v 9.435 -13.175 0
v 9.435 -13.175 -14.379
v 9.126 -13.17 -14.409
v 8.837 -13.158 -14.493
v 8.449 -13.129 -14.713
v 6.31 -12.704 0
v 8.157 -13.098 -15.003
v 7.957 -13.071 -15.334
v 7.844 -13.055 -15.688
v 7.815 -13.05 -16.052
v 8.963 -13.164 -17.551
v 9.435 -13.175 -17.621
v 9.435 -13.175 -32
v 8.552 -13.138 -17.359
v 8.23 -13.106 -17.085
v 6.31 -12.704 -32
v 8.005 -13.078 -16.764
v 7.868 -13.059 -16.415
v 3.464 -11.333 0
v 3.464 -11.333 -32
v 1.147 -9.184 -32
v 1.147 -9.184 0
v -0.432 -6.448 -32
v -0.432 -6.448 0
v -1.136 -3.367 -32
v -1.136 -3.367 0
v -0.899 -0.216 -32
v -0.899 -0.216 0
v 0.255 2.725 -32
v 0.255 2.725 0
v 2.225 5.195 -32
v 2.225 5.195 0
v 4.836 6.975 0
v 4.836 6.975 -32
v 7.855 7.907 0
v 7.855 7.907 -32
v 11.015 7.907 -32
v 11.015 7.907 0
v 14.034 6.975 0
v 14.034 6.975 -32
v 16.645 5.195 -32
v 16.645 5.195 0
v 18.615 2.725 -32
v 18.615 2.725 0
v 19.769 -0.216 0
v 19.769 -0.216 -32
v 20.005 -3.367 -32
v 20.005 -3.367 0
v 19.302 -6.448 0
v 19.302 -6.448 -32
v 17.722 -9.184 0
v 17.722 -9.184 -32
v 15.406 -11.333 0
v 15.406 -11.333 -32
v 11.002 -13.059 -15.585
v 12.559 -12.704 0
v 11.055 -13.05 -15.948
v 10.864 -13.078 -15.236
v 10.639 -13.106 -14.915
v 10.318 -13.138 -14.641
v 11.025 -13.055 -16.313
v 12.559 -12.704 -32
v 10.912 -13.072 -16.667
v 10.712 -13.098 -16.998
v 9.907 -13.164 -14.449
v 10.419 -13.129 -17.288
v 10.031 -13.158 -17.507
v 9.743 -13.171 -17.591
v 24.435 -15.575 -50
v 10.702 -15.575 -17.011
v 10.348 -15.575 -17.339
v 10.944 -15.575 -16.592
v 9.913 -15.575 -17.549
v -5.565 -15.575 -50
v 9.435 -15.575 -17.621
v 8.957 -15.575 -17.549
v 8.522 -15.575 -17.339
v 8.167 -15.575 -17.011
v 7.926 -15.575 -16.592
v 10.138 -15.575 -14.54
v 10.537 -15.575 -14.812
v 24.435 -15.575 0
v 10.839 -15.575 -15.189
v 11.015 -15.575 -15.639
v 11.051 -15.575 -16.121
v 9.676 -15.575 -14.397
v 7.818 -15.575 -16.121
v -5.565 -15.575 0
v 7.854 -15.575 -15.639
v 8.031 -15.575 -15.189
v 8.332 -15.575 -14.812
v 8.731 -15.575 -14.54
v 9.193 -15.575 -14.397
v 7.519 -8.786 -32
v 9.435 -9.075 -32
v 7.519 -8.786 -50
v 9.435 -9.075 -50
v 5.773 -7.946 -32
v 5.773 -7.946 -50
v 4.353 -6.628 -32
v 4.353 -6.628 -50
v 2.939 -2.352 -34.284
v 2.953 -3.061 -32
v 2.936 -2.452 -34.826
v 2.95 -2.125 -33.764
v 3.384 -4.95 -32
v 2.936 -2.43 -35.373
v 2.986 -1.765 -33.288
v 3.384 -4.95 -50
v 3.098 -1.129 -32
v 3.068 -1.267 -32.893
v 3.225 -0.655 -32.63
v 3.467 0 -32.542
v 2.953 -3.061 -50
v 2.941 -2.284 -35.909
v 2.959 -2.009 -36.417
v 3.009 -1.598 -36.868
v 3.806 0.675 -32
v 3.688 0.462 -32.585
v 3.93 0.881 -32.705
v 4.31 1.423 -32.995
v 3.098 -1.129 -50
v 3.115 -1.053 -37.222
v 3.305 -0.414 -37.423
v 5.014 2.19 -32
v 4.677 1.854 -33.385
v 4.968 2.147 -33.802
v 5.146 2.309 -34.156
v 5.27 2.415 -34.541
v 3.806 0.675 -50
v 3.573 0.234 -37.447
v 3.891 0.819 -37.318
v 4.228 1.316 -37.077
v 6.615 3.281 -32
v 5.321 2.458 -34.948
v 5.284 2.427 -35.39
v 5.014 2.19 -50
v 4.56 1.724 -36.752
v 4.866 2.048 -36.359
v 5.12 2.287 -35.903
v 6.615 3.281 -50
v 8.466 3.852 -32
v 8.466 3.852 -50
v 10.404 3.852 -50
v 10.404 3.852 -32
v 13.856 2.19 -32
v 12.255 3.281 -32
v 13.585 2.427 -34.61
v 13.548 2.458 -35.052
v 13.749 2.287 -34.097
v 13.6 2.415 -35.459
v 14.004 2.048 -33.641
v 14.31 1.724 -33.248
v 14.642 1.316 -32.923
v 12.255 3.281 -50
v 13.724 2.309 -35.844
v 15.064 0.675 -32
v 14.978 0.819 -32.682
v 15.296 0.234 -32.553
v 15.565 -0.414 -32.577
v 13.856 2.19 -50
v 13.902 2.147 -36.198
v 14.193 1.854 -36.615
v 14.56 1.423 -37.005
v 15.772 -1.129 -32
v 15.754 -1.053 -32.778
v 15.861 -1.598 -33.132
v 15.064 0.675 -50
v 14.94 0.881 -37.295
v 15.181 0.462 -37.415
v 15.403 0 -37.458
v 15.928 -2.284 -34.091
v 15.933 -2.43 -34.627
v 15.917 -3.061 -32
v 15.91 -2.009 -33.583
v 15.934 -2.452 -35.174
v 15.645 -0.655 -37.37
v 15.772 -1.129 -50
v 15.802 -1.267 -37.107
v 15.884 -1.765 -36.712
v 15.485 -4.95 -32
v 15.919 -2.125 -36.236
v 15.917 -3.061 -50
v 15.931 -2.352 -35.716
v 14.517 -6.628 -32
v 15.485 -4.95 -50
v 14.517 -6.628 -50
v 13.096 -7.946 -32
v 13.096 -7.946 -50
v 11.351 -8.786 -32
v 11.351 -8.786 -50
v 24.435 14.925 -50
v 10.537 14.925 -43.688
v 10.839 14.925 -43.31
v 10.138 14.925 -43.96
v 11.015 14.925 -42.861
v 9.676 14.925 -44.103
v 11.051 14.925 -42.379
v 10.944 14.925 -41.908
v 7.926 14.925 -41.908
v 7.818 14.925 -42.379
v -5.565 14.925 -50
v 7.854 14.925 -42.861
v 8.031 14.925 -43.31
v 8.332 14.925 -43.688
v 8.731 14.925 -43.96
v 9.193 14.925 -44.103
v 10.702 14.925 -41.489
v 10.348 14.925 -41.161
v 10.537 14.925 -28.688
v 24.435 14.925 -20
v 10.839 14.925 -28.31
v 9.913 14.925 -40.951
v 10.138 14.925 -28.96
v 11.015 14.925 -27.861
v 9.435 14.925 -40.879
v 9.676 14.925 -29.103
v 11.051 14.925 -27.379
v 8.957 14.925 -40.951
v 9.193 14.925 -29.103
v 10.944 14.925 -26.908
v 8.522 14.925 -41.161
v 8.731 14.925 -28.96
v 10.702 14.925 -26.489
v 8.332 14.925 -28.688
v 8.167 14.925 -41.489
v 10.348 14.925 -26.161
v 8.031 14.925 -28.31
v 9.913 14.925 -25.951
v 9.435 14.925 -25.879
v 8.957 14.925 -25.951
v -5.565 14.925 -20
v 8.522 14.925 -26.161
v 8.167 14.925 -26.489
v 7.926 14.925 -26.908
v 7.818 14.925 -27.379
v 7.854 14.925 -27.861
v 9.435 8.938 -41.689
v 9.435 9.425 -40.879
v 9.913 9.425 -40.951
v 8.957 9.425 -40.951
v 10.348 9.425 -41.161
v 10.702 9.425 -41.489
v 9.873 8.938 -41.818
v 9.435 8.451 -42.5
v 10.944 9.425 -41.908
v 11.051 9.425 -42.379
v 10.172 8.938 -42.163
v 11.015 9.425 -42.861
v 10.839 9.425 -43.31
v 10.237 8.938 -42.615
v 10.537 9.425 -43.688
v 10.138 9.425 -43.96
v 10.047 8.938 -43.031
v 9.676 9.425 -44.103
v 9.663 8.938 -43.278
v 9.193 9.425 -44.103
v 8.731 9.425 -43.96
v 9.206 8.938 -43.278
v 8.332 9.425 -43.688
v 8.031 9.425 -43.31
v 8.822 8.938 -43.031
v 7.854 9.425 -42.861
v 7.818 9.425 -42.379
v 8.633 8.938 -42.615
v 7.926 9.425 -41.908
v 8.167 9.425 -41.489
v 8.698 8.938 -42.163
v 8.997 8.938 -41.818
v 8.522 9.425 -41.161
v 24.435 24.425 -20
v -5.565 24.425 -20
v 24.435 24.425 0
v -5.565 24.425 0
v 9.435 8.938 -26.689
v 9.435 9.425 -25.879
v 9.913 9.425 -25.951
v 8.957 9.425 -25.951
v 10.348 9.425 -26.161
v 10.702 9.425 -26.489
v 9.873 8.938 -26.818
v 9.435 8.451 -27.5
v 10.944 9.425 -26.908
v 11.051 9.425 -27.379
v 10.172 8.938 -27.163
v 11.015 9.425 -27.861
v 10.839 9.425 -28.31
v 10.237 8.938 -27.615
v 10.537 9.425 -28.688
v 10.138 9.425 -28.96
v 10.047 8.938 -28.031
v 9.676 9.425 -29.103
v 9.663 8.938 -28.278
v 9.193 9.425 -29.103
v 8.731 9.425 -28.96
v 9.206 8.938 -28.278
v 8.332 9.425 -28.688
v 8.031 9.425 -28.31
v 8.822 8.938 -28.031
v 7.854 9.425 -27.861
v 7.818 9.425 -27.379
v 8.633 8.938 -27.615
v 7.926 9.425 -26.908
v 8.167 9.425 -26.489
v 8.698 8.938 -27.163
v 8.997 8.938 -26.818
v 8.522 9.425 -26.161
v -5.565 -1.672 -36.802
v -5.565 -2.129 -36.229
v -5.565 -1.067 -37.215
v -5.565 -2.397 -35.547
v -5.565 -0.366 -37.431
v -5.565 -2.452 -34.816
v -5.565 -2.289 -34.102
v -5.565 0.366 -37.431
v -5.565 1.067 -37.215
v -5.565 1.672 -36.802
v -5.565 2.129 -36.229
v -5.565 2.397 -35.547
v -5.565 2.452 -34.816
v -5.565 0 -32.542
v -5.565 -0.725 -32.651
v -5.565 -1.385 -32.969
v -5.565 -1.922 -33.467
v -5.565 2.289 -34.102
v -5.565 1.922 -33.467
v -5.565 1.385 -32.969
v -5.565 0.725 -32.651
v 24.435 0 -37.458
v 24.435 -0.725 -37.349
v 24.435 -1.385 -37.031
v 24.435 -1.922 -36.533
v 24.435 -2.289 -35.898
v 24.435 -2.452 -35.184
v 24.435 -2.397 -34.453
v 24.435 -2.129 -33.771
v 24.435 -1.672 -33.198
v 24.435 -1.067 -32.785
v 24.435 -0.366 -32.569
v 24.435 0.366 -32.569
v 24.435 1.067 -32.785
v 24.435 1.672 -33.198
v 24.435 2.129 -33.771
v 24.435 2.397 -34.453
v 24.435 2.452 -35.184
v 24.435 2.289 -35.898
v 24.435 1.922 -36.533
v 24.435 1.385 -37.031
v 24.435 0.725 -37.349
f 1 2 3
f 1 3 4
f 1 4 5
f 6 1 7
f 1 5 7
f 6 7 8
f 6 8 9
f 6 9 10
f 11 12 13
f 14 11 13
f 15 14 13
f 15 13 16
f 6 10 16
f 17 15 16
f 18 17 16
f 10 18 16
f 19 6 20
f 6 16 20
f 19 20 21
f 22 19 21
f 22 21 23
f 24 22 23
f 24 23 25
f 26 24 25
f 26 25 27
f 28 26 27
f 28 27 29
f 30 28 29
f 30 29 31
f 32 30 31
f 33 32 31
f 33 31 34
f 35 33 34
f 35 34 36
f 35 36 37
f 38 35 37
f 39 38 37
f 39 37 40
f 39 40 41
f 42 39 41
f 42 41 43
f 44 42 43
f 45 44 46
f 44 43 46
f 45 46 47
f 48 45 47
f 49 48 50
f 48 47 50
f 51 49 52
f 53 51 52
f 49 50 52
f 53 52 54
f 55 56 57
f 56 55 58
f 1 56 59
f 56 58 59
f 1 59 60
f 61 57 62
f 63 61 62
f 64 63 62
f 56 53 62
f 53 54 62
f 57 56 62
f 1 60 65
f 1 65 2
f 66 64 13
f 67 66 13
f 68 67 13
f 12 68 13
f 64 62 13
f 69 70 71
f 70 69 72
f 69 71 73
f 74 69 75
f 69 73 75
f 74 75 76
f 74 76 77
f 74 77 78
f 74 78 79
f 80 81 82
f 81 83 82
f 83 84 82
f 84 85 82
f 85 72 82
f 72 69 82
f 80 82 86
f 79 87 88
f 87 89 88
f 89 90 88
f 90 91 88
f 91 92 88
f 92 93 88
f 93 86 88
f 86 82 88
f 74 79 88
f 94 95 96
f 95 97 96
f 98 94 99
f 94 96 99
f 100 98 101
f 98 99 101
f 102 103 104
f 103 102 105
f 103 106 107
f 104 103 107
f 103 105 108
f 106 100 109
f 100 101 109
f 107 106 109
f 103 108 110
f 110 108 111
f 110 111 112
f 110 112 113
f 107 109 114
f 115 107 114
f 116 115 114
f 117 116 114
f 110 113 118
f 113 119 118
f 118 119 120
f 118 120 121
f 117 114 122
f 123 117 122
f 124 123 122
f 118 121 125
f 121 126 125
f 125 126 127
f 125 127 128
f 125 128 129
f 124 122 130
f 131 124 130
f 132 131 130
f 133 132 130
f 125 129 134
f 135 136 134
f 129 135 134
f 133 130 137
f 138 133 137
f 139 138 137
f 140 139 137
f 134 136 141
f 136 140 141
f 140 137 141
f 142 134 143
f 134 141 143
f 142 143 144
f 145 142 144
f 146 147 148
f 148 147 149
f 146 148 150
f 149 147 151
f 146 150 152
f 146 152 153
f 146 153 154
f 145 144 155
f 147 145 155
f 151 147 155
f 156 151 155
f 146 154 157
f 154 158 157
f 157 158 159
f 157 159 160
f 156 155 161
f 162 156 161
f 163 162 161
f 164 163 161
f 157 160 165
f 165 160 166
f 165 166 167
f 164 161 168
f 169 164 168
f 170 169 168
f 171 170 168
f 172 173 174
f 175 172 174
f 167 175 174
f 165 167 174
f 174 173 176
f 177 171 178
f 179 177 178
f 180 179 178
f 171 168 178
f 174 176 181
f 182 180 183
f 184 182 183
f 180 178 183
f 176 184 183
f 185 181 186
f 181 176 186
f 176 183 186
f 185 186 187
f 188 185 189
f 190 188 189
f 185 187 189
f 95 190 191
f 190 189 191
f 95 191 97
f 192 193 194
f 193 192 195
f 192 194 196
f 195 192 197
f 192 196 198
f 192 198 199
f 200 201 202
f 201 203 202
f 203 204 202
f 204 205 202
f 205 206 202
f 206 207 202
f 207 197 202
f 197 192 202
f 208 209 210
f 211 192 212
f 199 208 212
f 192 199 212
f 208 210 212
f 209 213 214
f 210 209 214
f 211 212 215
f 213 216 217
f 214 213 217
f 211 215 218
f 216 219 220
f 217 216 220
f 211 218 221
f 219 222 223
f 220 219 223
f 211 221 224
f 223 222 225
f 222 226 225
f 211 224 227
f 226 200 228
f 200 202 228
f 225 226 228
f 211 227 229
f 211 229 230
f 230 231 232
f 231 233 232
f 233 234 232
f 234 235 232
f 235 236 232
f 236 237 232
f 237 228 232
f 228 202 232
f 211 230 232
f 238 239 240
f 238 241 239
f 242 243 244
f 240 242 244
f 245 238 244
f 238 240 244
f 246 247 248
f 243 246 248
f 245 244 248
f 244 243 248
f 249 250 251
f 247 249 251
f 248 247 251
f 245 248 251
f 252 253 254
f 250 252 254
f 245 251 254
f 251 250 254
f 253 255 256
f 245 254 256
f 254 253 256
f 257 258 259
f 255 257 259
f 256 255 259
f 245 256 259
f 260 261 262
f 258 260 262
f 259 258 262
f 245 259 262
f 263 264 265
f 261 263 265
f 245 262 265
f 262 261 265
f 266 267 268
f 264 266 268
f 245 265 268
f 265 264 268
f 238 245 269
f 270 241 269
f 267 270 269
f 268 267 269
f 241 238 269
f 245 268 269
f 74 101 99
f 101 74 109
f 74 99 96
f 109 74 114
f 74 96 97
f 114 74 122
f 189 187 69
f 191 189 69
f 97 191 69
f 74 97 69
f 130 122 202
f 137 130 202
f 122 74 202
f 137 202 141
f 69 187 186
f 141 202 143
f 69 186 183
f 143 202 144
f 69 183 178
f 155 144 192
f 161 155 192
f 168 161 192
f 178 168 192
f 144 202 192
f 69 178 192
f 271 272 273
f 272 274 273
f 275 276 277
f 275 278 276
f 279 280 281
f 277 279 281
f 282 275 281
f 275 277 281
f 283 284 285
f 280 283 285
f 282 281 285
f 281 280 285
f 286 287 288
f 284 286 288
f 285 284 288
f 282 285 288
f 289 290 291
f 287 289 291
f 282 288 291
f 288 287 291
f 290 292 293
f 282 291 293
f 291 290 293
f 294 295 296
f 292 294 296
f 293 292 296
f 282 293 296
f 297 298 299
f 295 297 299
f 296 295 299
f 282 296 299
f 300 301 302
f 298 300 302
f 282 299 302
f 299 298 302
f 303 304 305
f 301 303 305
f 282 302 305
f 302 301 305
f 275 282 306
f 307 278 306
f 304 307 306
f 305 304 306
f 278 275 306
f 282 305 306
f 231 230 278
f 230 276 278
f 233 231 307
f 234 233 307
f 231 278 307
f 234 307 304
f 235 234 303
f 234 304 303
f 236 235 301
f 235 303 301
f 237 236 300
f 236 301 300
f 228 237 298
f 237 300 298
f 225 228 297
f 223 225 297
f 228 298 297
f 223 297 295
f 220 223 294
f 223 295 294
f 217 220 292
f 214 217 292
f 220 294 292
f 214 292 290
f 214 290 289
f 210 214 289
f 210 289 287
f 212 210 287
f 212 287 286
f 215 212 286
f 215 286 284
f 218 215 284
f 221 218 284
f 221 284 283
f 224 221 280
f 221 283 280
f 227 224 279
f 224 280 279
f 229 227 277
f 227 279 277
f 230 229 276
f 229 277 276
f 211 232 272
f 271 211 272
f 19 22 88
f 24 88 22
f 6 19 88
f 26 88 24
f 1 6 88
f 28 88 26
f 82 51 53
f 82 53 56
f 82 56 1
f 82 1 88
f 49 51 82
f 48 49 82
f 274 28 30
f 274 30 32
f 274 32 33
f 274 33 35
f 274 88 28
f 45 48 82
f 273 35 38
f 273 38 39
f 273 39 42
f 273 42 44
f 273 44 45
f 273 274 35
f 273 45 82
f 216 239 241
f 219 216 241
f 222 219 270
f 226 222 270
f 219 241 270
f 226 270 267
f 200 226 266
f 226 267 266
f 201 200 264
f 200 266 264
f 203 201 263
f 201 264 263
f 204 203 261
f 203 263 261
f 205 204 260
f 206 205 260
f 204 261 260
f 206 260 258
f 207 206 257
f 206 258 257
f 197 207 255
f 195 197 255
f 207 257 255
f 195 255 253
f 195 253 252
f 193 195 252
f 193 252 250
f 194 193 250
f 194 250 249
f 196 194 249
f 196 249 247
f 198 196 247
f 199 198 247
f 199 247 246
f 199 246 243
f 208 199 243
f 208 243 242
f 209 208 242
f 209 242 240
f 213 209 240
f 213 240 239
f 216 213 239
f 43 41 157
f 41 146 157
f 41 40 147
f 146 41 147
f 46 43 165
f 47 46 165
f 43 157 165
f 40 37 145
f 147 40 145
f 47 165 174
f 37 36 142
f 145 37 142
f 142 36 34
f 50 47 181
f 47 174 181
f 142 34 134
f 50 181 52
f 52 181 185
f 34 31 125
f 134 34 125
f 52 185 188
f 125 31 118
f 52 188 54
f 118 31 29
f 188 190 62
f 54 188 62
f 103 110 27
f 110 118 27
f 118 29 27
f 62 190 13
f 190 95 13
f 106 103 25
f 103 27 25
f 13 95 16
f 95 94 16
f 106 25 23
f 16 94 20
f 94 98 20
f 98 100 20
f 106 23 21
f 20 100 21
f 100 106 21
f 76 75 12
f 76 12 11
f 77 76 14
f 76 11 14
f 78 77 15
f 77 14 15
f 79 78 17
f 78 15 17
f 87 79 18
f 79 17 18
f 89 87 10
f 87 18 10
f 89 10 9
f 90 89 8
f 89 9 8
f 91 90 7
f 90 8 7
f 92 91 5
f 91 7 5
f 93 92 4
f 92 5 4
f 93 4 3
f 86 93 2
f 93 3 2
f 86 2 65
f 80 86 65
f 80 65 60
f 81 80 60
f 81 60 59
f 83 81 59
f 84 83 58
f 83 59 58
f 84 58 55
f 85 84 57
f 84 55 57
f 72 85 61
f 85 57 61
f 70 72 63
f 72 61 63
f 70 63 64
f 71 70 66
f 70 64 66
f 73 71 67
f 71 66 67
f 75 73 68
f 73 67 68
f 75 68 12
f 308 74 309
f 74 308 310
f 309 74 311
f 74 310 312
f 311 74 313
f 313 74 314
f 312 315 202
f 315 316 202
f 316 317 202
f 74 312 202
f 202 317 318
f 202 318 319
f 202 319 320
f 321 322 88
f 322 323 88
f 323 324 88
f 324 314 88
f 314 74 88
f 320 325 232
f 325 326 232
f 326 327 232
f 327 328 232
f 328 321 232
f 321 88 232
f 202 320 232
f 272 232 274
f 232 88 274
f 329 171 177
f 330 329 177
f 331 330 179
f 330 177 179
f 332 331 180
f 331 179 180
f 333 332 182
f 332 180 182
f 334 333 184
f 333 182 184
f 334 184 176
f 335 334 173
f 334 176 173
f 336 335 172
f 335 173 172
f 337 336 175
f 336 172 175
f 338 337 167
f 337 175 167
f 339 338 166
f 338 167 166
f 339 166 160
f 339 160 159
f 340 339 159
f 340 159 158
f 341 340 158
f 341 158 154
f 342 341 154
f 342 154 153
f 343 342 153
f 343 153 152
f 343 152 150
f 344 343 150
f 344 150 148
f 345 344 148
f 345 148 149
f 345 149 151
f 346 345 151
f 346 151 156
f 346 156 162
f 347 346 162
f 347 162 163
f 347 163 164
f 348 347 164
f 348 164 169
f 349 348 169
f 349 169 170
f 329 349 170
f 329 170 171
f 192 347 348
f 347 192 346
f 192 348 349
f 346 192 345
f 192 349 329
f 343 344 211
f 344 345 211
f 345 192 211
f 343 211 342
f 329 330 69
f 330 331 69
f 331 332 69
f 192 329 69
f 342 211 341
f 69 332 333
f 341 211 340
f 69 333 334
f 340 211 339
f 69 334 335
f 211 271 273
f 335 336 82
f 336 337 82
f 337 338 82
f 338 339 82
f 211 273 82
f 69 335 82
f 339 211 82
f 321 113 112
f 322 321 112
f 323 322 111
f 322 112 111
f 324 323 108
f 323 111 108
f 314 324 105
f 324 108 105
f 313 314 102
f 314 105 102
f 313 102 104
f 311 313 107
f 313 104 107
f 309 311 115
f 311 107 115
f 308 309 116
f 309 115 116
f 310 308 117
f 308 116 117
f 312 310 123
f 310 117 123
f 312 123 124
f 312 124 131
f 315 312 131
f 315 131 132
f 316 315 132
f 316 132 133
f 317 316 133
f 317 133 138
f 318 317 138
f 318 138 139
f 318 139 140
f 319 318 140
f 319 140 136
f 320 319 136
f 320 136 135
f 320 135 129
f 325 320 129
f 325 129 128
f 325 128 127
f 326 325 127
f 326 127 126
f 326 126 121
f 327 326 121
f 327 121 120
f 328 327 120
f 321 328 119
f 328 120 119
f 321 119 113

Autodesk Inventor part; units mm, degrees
ref_plane "YZ Plane" through (0, 0, 0) normal (1, 0, 0) x (0, 1, 0)
ref_plane "XZ Plane" through (0, 0, 0) normal (0, 1, 0) x (-1, 0, 0)
ref_plane "XY Plane" through (0, 0, 0) normal (0, 0, 1) x (1, 0, 0)
sketch "Esboço1" plane through (0, 0, 0) normal (0, 0, 1) x (1, 0, 0)
  circle A0 centre (9.5, -2.575) radius 10.5 construction
  line L0 (21.9348, 5.0533) -> (21.9348, -29.9467) construction
  line L1 (-3.0652, -29.9467) -> (-3.0652, 5.0533) construction
  circle A1 centre (9.5, -2.575) radius 10.575 construction
  line L2 (21.9348, -13.15) -> (-3.0652, -13.15) construction
  line L3 (9.4348, -13.15) -> (9.4348, 4.425) construction
  line L4 (-5.5652, 24.425) -> (24.4348, 24.425)
  line L5 (24.4348, 24.425) -> (24.4348, -15.575)
  line L6 (24.4348, -15.575) -> (-5.5652, -15.575)
  line L7 (-5.5652, -15.575) -> (-5.5652, 24.425)
  line L8 (-5.5652, 24.425) -> (24.4348, -15.575) construction
  line L9 (24.4348, 24.425) -> (-5.5652, -15.575) construction
  point P0 (0, 0)
  dimension "d1" = 21.15
  dimension "d3" = 30
  dimension "d4" = 40
  dimension "d51" = 13
extrude "Extrusão1" add sketch "Esboço1" against normal blind 50
sketch "Esboço2" plane through (0, 0, 0) normal (0, 0, 1) x (1, 0, 0)
  circle A0 centre (9.4348, -2.575) radius 5.995 construction
  line L0 (24.4348, -15.575) -> (-5.5652, -15.575) projected
  line L1 (-5.5652, -15.575) -> (-5.5652, 24.425) projected
  dimension "d52" = 13
  dimension "d53" = 15
hole "Furo1" at (9.4348, -2.575, 0) direction (0, 0, -1) diameter 13 end through all counterbore diameter 21.2 counterbore depth 32
sketch "Esboço3" plane through (-5.5652, -15.575, 0) normal (-1, 0, 0) x (0, 0, 1)
  line L0 (-50, 0) -> (-50, 40) construction
  line L1 (0, 40) -> (0, 0) construction
  line L2 (-50, 40) -> (0, 40) construction
  line L3 (0, 40) -> (0, 0) construction
  line L4 (0, 0) -> (-50, 0) construction
  line L5 (-50, 0) -> (-50, 40) construction
  line L6 (0, 15.575) -> (-50, 15.575) construction
  line L7 (-35, 15.575) -> (-35, 40) construction
hole "Furo2" at (-5.5652, 0, -35) direction (1, 0, 0) diameter 4.917 depth 13 tip angle 118 thread size "M6x1" class "6H" standard "ANSI Metric M Profile"
sketch "Esboço4" plane through (-5.5652, -15.575, 0) normal (-1, 0, 0) x (0, 0, 1)
  line L0 (-50, 30.5) -> (-20, 30.5)
  line L1 (-20, 30.5) -> (-20, 40)
  line L2 (-20, 40) -> (-50, 40)
  line L3 (-50, 40) -> (-50, 30.5)
  point P0 (0, 15.575)
  point P1 (-50, 0)
  dimension "d22" = 30.5
  dimension "d23" = 30
extrude "Extrusão2" cut sketch "Esboço4" against normal blind 31.25
sketch "Esboço6" plane through (24.4348, -15.575, 0) normal (1, 0, 0) x (0, 0, -1)
  circle A0 centre (35, 15.575) radius 2.4585 construction
  circle A1 centre (35, 15.575) radius 2.4585 construction
  point P0 (0, 15.575)
hole "Furo3" at (24.4348, 0, -35) direction (-1, 0, 0) diameter 4.917 depth 13 tip angle 118 thread size "M6x1" class "6H" standard "ANSI Metric M Profile"
sketch "Esboço7" plane through (-5.5652, -15.575, 0) normal (0, -1, 0) x (1, 0, 0)
  line L0 (0, 0) -> (30, 0) projected
  line L1 (15, 0) -> (15, -16) construction
  point P0 (5.5652, 0)
  dimension "d33" = 16
hole "Furo4" at (9.4348, -15.575, -16) direction (0, 1, 0) diameter 3.242 depth 5.18 tip angle 118 thread size "M4x0.7" class "6H" standard "ANSI Metric M Profile"
sketch "Esboço8" plane through (-5.5652, 14.925, -20) normal (0, 1, 0) x (1, 0, 0)
  line L0 (30, 0) -> (0, 0) projected
  line L1 (30, 30) -> (0, 30) projected
  line L2 (30, -20) -> (30, 30) projected
  line L3 (0, -20) -> (0, 30) projected
  line L4 (15, 0) -> (15, 7.5) construction
  line L5 (15, 30) -> (15, 22.5) construction
  point P0 (5.5652, -20)
  dimension "d41" = 7.5
  dimension "d42" = 7.5
hole "Furo5" at (9.4348, 14.925, -27.5) at (9.4348, 14.925, -42.5) direction (0, -1, 0) diameter 3.242 depth 5.5 tip angle 118 thread size "M4x0.7" class "6H" standard "ANSI Metric M Profile"
properties part number "carro_do_rolamento_direito" material "Alumínio 6061"
